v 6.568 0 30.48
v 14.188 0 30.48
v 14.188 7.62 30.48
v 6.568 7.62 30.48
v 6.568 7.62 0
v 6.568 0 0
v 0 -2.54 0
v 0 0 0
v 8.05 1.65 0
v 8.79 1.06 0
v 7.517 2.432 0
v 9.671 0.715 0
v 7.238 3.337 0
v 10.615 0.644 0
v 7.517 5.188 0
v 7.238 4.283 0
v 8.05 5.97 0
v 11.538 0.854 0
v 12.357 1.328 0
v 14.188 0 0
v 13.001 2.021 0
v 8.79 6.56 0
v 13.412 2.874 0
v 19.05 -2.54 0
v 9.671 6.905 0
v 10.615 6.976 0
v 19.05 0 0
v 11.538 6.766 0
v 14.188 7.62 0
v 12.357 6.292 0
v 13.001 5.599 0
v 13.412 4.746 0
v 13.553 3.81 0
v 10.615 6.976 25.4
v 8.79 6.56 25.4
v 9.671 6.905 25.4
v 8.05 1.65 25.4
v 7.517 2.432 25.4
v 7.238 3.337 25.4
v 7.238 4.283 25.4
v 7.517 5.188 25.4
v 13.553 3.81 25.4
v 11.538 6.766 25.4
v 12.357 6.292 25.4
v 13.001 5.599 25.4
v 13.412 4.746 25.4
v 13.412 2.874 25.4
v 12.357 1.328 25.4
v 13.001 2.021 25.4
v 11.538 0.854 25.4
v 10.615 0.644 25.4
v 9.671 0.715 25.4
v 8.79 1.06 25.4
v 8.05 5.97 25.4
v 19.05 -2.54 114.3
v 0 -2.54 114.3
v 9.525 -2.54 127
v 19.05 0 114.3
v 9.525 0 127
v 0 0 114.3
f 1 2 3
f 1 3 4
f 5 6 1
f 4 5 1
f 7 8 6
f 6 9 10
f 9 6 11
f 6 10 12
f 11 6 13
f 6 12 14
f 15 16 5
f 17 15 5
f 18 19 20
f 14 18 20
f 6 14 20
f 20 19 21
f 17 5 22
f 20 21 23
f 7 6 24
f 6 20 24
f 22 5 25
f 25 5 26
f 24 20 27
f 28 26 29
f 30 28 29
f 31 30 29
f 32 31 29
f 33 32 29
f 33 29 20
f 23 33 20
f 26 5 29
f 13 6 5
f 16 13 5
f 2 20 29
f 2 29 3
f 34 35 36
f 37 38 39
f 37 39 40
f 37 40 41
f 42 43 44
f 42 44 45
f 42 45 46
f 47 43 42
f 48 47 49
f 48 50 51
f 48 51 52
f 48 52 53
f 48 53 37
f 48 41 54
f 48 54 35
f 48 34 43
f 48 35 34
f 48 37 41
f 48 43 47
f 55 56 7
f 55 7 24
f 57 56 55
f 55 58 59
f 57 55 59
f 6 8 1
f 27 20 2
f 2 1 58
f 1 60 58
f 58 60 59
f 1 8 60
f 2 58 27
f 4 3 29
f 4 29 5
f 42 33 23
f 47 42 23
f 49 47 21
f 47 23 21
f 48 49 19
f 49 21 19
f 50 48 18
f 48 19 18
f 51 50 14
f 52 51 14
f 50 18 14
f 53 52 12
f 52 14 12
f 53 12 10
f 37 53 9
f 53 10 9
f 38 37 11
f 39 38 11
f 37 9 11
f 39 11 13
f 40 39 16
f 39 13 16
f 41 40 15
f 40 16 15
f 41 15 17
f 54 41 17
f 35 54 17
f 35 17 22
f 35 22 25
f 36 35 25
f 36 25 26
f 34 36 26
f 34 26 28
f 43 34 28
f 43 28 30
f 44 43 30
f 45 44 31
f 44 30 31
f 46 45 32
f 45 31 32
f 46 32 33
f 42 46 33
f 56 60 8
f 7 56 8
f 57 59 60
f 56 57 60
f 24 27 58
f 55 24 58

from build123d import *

# Parameters (mm, degrees)
F1_DEPTH = 2.54
F2_W     = 7.62
F2_H     = 30.48
F3_DEPTH = 7.62
F4_R     = 3.175
F5_DEPTH = 25.4


with BuildPart() as f1:
    # F0 (on Front) → F1 (new body)
    with BuildSketch(Plane.XZ):
        Polygon((0, 114.3), (0, 0), (19.05, 0), (19.05, 114.3), (9.525, 127), align=None)
    extrude(amount=F1_DEPTH)

    # F2 (on face) → F3 (join)
    with BuildSketch(Plane(origin=(0, 0, 0), x_dir=(-1, 0, 0), z_dir=(0, 1, 0))):
        with Locations((-10.377643, 15.24)):
            Rectangle(F2_W, F2_H)
    extrude(amount=F3_DEPTH)

    # F4 (on face) → F5 (cut)
    with BuildSketch(Plane(origin=(0, 0, 0), x_dir=(1, 0, 0), z_dir=(0, 0, -1))):
        with Locations((10.377643, -3.81)):
            Circle(F4_R)
    extrude(amount=-F5_DEPTH, mode=Mode.SUBTRACT)


solid = f1.part
